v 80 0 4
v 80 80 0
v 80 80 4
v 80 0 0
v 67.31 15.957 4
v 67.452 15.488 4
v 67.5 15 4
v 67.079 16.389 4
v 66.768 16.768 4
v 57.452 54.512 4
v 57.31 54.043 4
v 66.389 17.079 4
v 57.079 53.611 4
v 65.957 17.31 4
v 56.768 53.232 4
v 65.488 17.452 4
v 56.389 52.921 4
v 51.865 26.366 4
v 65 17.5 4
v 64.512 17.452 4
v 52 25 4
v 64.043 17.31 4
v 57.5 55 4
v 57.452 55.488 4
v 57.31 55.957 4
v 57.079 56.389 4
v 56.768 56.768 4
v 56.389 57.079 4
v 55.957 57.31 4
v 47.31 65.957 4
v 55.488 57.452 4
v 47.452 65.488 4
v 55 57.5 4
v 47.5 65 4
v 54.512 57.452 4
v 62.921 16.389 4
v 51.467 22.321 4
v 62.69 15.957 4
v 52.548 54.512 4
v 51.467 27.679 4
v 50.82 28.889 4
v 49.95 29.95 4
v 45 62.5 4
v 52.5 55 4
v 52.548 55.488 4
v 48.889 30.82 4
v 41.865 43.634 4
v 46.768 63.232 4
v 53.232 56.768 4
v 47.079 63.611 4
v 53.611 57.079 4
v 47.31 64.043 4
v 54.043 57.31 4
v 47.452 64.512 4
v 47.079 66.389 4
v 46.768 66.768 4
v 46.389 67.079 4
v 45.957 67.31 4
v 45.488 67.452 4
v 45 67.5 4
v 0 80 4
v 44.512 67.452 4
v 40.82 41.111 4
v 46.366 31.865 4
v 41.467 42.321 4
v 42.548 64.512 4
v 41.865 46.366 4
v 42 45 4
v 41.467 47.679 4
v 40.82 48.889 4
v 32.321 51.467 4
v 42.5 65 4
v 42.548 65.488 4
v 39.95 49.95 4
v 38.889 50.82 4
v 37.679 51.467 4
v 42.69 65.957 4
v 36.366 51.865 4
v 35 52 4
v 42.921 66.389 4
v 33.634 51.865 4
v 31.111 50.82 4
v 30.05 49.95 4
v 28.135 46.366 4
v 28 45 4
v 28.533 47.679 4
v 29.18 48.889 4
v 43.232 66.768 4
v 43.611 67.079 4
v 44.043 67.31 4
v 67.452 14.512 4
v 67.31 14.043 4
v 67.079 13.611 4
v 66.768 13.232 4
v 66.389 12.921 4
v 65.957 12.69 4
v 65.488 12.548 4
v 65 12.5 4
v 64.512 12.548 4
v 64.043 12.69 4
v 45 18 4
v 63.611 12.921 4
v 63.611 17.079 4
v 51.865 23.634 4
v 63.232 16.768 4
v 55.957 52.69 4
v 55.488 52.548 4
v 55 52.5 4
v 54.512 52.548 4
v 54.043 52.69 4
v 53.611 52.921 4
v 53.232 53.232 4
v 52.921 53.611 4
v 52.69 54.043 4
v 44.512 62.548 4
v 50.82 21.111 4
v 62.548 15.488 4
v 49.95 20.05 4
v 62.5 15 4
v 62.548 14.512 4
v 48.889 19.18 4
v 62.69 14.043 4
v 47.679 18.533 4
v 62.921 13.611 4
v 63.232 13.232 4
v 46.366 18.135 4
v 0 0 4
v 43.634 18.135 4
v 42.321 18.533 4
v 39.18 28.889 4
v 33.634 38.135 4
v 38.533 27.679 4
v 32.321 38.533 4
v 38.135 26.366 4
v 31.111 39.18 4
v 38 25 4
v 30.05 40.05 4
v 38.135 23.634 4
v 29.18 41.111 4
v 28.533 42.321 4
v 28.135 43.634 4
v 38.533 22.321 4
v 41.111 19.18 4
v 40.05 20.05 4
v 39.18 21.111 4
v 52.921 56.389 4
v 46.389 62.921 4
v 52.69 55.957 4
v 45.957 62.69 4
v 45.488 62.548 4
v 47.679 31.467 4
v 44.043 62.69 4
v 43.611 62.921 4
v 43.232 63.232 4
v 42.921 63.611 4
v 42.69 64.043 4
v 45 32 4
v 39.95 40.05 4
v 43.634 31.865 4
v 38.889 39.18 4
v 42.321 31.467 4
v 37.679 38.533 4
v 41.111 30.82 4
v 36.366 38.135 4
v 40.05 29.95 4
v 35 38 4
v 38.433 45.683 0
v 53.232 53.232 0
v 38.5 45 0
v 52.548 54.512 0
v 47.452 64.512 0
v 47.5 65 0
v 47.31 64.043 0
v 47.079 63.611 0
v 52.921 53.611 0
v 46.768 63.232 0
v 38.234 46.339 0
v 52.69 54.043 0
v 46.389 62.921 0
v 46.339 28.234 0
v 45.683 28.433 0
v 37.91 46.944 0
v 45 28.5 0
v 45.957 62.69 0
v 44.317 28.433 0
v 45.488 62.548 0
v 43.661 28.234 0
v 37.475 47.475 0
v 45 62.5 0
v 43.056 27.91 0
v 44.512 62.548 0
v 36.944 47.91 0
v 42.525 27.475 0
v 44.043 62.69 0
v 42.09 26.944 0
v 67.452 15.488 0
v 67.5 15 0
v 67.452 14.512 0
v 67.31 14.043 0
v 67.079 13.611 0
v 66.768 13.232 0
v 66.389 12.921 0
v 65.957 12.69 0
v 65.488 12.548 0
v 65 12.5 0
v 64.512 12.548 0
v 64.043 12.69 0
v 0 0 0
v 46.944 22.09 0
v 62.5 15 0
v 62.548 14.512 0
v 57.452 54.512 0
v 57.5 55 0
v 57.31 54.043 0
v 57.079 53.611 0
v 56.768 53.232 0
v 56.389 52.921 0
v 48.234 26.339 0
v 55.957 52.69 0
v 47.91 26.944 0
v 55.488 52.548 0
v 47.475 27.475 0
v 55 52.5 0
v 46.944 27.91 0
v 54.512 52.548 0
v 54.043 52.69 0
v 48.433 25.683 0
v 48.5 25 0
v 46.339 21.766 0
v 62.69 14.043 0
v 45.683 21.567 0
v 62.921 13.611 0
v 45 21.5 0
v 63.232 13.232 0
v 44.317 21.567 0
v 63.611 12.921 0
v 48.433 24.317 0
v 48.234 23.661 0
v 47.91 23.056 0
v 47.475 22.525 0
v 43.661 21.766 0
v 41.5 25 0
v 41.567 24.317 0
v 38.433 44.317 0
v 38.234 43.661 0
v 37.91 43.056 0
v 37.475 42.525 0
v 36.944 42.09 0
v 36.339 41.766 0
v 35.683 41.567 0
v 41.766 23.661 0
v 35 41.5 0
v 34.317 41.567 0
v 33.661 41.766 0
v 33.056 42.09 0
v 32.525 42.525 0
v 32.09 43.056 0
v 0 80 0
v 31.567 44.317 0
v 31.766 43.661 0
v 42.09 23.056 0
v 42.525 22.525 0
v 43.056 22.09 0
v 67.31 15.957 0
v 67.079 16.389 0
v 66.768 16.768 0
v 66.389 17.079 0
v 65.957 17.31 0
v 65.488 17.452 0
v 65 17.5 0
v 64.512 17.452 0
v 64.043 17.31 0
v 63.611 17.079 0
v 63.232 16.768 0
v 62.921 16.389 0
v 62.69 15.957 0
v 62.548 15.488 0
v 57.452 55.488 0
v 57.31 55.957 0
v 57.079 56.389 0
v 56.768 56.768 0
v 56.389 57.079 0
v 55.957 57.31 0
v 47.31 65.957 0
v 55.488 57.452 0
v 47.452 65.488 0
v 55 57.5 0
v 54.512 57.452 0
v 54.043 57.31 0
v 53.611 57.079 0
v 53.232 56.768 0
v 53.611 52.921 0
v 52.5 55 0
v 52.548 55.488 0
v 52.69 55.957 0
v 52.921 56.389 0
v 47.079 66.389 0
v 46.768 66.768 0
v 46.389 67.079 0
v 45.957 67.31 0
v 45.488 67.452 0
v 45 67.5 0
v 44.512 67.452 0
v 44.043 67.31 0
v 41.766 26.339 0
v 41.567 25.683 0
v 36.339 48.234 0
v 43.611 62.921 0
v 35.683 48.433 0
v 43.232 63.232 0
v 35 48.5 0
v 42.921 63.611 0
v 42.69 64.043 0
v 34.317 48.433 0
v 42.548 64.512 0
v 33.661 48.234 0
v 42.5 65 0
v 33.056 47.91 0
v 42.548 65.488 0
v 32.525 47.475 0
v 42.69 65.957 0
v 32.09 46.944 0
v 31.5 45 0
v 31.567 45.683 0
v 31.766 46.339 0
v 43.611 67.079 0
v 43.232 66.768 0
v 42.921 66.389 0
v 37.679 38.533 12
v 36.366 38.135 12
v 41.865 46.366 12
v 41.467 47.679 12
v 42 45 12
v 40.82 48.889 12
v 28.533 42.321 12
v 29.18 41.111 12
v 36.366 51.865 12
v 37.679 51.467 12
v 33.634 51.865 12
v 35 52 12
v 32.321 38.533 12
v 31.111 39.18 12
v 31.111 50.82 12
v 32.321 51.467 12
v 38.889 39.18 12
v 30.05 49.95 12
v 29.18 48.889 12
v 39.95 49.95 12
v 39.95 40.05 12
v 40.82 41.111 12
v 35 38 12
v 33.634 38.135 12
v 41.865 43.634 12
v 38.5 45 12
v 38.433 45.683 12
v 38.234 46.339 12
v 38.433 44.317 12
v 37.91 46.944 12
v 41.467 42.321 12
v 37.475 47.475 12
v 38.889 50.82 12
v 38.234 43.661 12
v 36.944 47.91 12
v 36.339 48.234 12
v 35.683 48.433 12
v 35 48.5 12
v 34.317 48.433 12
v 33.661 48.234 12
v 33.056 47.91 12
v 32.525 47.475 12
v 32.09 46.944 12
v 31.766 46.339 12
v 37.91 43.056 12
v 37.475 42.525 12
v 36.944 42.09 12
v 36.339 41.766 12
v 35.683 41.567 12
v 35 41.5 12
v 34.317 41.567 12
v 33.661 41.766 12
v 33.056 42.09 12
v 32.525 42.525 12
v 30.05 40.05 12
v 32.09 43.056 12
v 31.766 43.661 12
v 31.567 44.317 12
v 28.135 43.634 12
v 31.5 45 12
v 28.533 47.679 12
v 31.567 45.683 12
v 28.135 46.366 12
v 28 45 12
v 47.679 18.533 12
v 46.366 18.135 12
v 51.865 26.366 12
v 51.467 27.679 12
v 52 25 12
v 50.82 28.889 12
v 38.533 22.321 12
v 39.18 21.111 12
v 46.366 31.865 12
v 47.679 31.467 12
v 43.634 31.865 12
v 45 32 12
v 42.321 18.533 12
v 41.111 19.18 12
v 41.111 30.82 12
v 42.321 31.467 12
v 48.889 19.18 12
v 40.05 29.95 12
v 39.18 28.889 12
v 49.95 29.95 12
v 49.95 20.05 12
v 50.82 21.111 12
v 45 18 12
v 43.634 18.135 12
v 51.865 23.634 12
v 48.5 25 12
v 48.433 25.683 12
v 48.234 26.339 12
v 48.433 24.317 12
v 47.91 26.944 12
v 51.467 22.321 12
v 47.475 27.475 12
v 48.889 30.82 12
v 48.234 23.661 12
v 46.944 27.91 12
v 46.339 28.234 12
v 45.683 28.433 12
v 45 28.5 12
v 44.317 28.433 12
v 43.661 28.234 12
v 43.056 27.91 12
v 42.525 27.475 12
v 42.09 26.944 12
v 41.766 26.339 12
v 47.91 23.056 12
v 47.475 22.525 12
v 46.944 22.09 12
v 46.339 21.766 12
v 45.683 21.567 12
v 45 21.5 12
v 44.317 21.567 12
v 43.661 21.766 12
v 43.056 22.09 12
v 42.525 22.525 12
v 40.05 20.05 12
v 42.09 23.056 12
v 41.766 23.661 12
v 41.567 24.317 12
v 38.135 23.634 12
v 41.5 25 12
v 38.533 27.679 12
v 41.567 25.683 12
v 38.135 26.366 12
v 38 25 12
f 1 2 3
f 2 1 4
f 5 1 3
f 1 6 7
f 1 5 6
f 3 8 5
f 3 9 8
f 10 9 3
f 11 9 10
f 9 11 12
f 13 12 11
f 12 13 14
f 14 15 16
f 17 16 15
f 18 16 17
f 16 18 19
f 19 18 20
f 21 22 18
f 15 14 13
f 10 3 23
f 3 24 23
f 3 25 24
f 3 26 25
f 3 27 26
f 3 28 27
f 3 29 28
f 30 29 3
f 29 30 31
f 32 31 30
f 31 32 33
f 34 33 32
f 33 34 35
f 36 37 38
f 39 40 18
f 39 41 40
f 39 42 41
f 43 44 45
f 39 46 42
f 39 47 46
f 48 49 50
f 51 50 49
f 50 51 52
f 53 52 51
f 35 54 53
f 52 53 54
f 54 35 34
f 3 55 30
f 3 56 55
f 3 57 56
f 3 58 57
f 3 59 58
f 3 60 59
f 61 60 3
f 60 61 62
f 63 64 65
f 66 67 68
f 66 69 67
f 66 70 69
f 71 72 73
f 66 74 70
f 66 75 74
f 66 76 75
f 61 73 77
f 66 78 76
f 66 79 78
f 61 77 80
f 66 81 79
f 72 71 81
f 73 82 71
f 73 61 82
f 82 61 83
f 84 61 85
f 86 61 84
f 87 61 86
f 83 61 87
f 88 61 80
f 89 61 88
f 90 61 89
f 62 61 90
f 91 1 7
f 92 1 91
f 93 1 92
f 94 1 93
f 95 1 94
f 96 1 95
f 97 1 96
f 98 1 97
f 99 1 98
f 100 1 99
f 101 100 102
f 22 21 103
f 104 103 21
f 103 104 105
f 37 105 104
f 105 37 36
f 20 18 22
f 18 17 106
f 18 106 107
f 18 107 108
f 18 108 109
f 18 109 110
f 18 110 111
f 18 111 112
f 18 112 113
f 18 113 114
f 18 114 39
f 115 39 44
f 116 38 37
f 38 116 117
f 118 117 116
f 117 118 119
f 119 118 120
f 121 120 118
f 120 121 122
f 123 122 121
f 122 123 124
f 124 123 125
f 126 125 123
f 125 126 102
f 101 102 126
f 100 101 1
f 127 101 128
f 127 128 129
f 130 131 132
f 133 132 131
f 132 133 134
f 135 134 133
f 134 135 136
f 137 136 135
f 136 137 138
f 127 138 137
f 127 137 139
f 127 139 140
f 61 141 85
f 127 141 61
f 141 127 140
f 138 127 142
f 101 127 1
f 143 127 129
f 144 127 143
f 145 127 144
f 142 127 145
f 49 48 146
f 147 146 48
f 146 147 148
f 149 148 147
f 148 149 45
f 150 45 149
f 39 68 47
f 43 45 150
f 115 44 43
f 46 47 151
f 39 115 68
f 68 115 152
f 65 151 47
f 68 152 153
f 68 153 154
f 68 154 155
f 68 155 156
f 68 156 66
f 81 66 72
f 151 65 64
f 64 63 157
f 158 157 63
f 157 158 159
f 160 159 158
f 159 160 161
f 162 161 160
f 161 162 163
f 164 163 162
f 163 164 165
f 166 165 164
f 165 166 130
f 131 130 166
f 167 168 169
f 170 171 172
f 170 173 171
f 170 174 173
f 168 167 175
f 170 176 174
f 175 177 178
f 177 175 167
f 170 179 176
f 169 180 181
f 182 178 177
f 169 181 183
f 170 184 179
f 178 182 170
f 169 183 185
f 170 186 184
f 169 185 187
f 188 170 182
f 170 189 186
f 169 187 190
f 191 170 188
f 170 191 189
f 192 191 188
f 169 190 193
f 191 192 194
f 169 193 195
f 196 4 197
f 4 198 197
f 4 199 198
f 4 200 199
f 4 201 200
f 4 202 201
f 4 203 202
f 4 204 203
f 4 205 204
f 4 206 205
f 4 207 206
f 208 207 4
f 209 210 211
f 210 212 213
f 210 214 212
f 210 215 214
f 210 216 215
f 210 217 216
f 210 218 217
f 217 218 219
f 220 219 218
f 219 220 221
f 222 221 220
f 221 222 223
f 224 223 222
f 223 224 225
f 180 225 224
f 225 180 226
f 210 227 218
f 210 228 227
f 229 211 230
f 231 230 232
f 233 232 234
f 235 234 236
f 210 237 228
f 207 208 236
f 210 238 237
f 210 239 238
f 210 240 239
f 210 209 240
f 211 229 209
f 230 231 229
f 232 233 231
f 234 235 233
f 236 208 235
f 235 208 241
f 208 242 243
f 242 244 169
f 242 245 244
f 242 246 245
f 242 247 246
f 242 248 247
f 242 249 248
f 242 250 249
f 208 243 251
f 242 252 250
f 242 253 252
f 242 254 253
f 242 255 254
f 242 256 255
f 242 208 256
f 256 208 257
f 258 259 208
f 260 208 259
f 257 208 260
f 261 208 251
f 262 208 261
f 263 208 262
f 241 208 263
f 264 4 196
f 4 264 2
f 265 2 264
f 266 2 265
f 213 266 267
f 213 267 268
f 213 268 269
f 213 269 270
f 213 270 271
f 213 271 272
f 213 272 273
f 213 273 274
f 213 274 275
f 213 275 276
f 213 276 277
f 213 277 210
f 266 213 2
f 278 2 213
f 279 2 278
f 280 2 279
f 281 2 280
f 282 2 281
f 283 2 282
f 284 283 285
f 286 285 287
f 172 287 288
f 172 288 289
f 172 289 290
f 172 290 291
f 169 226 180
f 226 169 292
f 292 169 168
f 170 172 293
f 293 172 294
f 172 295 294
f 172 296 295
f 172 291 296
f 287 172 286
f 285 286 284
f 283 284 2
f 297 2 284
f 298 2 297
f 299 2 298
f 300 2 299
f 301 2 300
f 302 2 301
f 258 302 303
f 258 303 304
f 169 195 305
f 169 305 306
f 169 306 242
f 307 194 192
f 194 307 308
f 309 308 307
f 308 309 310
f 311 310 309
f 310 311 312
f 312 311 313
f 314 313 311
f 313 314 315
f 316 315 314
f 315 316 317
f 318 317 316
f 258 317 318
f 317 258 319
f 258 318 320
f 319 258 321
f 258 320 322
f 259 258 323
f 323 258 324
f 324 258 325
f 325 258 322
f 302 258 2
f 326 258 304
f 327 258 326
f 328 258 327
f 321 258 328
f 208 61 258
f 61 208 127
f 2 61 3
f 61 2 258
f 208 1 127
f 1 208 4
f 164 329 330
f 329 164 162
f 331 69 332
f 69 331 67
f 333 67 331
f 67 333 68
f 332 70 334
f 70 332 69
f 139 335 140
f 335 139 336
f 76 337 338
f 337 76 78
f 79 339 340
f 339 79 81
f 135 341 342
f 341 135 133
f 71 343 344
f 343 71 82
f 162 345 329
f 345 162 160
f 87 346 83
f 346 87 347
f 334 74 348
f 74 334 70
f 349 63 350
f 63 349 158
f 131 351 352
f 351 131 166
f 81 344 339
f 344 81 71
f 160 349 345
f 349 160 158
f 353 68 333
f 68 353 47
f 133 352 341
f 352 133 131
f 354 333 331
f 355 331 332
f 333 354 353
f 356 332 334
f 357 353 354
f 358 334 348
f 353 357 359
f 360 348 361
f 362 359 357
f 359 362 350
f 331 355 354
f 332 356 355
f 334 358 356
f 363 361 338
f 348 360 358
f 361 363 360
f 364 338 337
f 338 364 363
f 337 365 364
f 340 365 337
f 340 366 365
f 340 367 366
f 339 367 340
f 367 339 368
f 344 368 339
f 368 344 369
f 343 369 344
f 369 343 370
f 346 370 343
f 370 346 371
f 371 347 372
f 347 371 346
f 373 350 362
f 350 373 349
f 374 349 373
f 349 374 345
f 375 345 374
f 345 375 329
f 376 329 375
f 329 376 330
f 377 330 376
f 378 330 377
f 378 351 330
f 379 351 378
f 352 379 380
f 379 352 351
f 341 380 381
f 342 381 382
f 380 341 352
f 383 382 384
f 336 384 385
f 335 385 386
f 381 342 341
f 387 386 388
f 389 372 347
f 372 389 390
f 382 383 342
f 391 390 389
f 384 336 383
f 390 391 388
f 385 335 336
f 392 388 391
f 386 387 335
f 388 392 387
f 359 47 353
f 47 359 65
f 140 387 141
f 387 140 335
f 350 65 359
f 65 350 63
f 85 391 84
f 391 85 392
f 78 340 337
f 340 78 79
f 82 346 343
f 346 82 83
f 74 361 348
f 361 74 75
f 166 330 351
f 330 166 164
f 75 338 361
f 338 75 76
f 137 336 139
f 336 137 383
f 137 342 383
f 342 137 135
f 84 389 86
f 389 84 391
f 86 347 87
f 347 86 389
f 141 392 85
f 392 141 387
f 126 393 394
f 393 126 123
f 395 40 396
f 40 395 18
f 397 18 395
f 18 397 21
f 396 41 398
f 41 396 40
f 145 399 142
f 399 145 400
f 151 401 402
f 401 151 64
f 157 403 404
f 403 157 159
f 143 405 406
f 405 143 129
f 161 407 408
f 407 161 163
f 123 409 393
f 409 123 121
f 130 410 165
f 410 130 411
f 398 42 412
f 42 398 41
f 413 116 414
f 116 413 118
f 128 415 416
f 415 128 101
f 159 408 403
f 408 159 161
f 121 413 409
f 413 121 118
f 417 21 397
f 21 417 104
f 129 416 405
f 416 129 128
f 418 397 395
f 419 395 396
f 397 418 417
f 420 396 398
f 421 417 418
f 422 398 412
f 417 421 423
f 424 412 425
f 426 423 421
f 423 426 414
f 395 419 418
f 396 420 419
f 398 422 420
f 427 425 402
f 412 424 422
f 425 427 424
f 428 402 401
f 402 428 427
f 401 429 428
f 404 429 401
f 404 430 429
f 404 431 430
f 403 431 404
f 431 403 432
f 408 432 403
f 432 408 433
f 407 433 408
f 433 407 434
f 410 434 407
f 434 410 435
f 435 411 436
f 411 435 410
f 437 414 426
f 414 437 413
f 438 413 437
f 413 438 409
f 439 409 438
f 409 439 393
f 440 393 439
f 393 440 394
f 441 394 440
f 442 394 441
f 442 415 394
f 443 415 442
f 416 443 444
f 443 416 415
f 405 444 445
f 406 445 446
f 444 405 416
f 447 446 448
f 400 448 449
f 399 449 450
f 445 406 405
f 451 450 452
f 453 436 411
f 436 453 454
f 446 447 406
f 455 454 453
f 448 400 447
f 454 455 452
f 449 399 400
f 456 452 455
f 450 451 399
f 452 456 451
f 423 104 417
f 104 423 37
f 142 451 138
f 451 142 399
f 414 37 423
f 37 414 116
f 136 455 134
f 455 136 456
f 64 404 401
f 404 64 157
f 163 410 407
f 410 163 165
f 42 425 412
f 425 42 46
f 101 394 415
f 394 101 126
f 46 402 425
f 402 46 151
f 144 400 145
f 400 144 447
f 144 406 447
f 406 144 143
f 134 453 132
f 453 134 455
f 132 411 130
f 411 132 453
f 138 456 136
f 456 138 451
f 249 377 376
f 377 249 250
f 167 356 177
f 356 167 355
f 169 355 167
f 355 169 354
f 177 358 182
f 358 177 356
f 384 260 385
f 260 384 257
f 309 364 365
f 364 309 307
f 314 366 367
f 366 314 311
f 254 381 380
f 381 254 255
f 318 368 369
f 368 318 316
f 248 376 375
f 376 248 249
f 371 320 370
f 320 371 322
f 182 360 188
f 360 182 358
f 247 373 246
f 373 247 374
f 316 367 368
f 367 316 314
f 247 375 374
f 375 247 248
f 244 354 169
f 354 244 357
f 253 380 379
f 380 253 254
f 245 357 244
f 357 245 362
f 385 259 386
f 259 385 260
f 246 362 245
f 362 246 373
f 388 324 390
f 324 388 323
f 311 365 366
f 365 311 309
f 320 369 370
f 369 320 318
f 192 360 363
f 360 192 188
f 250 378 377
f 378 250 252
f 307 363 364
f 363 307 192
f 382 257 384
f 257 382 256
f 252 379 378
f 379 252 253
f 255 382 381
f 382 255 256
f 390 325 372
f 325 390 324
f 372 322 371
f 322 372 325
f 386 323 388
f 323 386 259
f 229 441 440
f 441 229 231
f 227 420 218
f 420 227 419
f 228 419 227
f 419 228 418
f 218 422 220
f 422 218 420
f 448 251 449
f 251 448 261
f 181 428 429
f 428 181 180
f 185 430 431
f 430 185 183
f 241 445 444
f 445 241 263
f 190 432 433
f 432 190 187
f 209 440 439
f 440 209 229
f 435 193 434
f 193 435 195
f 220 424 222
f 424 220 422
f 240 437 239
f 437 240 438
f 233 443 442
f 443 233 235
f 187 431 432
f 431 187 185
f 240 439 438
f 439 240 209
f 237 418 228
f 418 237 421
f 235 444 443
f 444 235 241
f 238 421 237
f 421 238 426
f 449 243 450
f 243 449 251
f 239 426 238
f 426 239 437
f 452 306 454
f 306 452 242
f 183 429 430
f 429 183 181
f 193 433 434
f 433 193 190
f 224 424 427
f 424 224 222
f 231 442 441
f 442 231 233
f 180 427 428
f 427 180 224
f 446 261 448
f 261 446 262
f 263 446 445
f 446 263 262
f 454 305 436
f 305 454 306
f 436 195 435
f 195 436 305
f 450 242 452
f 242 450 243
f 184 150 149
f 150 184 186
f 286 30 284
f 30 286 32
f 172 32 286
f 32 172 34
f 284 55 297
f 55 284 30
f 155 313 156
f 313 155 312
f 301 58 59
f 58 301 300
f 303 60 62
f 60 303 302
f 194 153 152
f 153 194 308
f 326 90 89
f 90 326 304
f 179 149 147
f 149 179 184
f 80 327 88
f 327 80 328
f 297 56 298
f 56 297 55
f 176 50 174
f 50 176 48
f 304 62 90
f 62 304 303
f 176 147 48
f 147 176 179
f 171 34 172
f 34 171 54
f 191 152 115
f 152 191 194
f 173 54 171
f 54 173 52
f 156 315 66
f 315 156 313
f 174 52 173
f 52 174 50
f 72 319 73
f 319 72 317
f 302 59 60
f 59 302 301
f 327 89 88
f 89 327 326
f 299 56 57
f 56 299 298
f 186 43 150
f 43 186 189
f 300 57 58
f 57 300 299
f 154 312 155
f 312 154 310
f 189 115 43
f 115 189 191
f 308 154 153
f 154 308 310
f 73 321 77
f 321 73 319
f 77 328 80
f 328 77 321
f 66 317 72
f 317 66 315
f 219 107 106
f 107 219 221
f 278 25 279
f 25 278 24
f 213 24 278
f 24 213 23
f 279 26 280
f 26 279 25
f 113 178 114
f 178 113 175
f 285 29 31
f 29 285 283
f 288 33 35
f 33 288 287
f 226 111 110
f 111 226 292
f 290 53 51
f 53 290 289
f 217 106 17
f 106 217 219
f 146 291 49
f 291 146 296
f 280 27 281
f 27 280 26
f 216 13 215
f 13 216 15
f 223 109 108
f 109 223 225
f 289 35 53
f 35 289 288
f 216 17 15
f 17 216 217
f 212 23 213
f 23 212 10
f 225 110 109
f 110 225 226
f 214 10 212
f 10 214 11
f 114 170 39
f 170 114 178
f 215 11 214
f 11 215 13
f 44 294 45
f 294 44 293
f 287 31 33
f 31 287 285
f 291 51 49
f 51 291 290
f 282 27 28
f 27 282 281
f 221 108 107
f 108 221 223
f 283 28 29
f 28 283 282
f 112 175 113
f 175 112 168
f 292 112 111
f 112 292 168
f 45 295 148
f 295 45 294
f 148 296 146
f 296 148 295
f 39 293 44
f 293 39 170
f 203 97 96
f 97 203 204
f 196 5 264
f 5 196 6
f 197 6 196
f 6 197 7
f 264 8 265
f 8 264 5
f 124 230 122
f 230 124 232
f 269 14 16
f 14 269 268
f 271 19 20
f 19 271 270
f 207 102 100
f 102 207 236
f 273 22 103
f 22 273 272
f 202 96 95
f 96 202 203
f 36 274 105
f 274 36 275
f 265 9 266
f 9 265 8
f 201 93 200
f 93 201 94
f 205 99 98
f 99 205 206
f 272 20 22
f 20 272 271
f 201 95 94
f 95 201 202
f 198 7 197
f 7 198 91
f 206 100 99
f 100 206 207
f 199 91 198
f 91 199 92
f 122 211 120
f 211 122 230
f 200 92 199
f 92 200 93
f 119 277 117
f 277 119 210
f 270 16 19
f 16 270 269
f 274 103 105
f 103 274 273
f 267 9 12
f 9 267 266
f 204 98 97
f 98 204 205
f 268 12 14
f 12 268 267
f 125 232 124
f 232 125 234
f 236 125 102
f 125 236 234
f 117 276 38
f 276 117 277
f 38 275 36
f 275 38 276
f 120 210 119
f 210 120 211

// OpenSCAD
$fn = 32;

// ----------------------------------------------------------------------
// Mixed field: bosses and holes at given coordinates
// ----------------------------------------------------------------------

// --- parameters (mm) ---
plate_l = 80;             // plate length, X
plate_w = 80;             // plate width, Y
plate_t = 4;              // plate thickness, Z
boss_d = 14;              // boss diameter
boss_h = 8;               // boss height above the plate
hole_d = 5;               // through hole diameter

total_h = plate_t + boss_h;  // overall height

difference() {
  union() {
    cube([plate_l, plate_w, plate_t]);
    translate([35, 45, plate_t]) cylinder(h = boss_h, d = boss_d);
    translate([45, 25, plate_t]) cylinder(h = boss_h, d = boss_d);
  }
  translate([35, 45, -1]) cylinder(h = total_h + 2, d = boss_d / 2);
  translate([45, 25, -1]) cylinder(h = total_h + 2, d = boss_d / 2);
  translate([45, 65, -1]) cylinder(h = plate_t + 2, d = hole_d);
  translate([55, 55, -1]) cylinder(h = plate_t + 2, d = hole_d);
  translate([65, 15, -1]) cylinder(h = plate_t + 2, d = hole_d);
}
